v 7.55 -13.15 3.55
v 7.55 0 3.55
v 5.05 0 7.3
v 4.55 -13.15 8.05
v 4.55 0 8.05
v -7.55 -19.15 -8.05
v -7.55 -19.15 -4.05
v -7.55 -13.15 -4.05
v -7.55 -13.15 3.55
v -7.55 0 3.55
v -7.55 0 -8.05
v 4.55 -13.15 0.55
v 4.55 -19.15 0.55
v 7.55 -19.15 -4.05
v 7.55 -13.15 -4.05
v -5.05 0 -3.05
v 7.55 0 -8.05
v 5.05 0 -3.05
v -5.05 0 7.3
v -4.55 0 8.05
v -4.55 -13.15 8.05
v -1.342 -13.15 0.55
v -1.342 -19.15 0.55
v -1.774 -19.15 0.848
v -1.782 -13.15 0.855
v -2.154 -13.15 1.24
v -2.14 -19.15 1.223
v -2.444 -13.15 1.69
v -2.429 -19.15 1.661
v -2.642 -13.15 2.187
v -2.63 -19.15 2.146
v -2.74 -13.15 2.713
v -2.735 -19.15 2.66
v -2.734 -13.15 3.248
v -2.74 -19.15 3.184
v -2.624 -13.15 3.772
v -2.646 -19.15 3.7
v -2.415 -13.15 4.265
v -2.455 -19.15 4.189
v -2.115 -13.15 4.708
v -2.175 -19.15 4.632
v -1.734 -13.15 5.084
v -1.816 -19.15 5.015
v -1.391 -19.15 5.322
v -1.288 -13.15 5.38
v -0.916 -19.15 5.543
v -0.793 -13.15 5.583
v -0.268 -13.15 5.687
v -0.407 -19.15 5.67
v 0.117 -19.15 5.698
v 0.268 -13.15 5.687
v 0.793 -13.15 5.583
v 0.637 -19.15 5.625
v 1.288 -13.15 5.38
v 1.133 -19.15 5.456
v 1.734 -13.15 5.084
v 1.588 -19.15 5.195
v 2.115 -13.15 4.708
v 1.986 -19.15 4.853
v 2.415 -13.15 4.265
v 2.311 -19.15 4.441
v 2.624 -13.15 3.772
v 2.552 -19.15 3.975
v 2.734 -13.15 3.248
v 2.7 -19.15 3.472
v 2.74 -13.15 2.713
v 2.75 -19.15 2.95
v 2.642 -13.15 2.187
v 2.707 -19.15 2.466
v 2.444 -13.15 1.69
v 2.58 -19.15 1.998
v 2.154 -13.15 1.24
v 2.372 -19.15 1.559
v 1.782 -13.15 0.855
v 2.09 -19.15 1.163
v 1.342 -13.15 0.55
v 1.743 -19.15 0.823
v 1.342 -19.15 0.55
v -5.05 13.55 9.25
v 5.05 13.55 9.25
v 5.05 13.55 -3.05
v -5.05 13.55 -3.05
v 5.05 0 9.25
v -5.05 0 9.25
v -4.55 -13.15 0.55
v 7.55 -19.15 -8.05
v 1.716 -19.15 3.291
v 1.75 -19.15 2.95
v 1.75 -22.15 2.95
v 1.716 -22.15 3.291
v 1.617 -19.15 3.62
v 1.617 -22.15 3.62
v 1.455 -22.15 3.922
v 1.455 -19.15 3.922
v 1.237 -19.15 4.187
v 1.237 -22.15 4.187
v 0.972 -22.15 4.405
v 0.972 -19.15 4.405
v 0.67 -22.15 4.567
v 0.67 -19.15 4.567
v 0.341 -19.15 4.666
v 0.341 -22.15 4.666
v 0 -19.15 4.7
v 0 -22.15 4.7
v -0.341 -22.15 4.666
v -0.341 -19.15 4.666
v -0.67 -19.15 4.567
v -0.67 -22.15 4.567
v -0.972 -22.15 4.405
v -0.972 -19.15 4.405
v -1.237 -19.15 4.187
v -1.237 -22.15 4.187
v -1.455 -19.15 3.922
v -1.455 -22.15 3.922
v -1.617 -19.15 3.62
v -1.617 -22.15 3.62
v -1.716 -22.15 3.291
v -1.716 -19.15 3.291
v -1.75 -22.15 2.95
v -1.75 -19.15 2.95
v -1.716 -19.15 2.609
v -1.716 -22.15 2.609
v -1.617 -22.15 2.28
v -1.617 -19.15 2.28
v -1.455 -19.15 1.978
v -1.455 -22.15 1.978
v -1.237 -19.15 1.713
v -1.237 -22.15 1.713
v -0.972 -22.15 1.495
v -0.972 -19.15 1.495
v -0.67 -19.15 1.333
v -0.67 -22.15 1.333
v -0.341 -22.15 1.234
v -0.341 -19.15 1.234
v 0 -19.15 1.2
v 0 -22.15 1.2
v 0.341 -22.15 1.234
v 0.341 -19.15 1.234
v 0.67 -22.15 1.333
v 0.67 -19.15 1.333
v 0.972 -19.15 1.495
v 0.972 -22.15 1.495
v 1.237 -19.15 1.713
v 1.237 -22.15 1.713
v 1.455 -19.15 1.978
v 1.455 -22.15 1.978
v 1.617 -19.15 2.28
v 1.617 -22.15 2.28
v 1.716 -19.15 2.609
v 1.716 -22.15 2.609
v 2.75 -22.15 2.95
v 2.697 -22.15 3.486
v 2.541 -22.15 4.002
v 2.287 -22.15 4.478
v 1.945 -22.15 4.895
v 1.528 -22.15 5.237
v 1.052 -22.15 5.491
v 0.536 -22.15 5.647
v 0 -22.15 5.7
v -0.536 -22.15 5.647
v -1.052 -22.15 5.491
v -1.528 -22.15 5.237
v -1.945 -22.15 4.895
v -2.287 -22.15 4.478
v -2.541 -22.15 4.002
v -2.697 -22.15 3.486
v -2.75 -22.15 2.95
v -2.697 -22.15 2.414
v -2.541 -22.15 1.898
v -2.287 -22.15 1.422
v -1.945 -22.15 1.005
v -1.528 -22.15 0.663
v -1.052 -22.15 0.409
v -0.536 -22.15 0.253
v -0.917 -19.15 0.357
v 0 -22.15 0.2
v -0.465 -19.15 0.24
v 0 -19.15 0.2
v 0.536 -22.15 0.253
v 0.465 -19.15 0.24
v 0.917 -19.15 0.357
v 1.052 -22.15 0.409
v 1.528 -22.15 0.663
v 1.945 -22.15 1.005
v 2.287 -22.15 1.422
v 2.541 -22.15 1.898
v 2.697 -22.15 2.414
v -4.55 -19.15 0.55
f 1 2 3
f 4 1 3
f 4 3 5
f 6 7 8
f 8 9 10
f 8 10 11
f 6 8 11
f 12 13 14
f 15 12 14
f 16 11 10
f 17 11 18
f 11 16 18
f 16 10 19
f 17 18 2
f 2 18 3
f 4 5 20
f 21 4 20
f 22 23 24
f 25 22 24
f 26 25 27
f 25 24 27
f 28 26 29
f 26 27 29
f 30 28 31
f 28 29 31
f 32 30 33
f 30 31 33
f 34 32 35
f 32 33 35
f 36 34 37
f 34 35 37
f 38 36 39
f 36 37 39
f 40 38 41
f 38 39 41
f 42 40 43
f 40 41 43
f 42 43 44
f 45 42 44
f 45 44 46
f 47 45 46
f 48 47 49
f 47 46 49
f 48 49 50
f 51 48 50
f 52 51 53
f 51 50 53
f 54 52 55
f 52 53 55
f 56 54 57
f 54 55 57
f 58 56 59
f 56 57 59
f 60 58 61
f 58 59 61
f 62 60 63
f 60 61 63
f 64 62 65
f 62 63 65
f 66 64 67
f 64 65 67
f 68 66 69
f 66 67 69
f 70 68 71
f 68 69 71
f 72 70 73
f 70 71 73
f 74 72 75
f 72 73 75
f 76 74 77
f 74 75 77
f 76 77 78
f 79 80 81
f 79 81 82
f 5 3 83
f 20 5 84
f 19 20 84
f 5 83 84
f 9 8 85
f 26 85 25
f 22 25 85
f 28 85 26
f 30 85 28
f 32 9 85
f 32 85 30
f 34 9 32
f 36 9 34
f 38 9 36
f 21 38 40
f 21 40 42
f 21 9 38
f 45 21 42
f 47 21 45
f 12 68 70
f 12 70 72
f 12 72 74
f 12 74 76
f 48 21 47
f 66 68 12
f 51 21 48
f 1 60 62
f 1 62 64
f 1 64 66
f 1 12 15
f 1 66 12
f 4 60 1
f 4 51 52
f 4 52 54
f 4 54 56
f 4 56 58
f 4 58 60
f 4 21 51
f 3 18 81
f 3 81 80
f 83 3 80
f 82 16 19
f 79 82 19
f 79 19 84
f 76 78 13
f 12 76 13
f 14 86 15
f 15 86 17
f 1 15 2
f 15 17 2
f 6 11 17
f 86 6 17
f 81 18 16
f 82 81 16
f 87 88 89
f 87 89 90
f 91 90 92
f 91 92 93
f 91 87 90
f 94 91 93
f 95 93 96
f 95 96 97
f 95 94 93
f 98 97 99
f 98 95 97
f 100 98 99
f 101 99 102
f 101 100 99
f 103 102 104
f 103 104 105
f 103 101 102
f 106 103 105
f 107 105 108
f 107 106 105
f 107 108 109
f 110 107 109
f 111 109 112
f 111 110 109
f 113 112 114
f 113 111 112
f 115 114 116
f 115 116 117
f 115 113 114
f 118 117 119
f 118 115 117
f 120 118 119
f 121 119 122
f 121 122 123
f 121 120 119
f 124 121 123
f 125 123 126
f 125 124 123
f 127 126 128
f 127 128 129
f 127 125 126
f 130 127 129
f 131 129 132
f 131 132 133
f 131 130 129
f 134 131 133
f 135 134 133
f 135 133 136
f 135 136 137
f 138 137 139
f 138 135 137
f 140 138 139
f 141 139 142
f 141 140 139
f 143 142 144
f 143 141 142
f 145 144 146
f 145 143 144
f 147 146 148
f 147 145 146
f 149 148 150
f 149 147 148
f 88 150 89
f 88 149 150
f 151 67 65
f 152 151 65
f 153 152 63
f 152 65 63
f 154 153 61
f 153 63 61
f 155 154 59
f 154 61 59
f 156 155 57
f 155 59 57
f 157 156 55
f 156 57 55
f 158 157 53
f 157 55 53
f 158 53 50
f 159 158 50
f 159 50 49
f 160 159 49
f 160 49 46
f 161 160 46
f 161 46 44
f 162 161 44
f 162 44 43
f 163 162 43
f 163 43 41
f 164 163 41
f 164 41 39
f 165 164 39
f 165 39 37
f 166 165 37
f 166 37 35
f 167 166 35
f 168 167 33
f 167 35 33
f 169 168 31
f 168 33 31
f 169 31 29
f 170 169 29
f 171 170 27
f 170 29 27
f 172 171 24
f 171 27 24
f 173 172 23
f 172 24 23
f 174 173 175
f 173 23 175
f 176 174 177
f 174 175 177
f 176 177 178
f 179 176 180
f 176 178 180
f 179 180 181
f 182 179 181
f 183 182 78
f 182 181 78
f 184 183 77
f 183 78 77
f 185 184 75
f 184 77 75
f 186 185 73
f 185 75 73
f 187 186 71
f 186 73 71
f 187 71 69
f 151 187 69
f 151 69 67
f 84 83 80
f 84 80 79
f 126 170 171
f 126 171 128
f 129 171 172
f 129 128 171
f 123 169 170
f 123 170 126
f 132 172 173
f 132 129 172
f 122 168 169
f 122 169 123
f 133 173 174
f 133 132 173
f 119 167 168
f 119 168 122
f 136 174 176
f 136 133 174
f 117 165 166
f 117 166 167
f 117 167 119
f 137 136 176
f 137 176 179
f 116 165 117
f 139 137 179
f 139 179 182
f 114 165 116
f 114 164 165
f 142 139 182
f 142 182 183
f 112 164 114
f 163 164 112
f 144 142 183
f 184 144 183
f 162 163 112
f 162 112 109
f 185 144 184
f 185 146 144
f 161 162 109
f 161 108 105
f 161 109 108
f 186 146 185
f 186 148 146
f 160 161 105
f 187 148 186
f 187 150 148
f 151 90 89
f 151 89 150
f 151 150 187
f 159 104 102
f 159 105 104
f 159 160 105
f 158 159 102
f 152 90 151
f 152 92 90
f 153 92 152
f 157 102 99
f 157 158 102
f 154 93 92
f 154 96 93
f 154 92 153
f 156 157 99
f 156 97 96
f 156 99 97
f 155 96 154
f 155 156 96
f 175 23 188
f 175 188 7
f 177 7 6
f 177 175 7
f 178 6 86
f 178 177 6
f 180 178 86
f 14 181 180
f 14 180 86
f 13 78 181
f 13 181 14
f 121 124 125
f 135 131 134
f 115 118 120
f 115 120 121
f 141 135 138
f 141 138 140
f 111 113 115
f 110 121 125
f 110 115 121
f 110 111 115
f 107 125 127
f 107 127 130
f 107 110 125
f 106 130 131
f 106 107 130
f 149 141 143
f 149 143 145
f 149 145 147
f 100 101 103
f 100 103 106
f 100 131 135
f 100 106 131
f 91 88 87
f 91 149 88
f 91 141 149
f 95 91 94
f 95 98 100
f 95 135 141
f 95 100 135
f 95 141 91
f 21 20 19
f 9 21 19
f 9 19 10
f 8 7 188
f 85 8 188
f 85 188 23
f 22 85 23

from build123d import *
from build123d import SkipClean  # not in build123d's __all__

# Parameters (mm, degrees)
F1_DEPTH = 19.15
F2_R     = 2.75
F2_R_2   = 1.75
F3_DEPTH = 3
F5_DEPTH = 6
F6_W     = 10.1
F6_H     = 12.3
F7_DEPTH = 13.55


# Not quite as in the source:
# - after a boolean that leaves OpenCascade's solid faulty, fix() repairs it


with BuildPart() as f1:
    # F0 (on Front) → F1 (new body)
    with BuildSketch(Plane.XZ):
        Polygon((4.55, 8.05), (-4.55, 8.05), (-7.55, 3.55), (-7.55, -8.05), (7.55, -8.05), (7.55, 3.55), align=None)
    extrude(amount=F1_DEPTH)

    # F2 (on face) → F3 (join)
    with BuildSketch(Plane.XZ.offset(19.15)):
        with Locations((0, 2.95)):
            Circle(F2_R)
        with Locations((0, 2.95)):
            Circle(F2_R_2, mode=Mode.SUBTRACT)
    extrude(amount=F3_DEPTH)

    # F4 (on face) → F5 (cut)
    with BuildSketch(Plane.XZ.offset(19.15)):
        with BuildLine():
            Line((-7.55, -4.05), (-4.55, 0.5498131504))
            Line((-4.55, 0.5498131504), (-1.3422380888, 0.5498131504))
            ThreePointArc((-1.3422380888, 0.5498131504), (0, 5.7), (1.3422380888, 0.5498131504))
            Line((1.3422380888, 0.5498131504), (4.55, 0.5498131504))
            Line((4.55, 0.5498131504), (7.55, -4.05))
            Line((7.55, -4.05), (7.55, 3.55))
            Line((7.55, 3.55), (4.55, 8.05))
            Line((4.55, 8.05), (-4.55, 8.05))
            Line((-4.55, 8.05), (-7.55, 3.55))
            Line((-7.55, 3.55), (-7.55, -4.05))
        make_face()
    with SkipClean():  # cleaning this boolean's faces spoils the solid; the shape is the same uncleaned
        extrude(amount=-F5_DEPTH, mode=Mode.SUBTRACT)

    # F6 (on face) → F7 (join)
    with BuildSketch(Plane(origin=(0, 0, 0), x_dir=(-1, 0, 0), z_dir=(0, 1, 0))):
        with Locations((0, 3.1)):
            Rectangle(F6_W, F6_H)
    extrude(amount=F7_DEPTH)

    add(f1.part.fix(), mode=Mode.REPLACE)


solid = f1.part
